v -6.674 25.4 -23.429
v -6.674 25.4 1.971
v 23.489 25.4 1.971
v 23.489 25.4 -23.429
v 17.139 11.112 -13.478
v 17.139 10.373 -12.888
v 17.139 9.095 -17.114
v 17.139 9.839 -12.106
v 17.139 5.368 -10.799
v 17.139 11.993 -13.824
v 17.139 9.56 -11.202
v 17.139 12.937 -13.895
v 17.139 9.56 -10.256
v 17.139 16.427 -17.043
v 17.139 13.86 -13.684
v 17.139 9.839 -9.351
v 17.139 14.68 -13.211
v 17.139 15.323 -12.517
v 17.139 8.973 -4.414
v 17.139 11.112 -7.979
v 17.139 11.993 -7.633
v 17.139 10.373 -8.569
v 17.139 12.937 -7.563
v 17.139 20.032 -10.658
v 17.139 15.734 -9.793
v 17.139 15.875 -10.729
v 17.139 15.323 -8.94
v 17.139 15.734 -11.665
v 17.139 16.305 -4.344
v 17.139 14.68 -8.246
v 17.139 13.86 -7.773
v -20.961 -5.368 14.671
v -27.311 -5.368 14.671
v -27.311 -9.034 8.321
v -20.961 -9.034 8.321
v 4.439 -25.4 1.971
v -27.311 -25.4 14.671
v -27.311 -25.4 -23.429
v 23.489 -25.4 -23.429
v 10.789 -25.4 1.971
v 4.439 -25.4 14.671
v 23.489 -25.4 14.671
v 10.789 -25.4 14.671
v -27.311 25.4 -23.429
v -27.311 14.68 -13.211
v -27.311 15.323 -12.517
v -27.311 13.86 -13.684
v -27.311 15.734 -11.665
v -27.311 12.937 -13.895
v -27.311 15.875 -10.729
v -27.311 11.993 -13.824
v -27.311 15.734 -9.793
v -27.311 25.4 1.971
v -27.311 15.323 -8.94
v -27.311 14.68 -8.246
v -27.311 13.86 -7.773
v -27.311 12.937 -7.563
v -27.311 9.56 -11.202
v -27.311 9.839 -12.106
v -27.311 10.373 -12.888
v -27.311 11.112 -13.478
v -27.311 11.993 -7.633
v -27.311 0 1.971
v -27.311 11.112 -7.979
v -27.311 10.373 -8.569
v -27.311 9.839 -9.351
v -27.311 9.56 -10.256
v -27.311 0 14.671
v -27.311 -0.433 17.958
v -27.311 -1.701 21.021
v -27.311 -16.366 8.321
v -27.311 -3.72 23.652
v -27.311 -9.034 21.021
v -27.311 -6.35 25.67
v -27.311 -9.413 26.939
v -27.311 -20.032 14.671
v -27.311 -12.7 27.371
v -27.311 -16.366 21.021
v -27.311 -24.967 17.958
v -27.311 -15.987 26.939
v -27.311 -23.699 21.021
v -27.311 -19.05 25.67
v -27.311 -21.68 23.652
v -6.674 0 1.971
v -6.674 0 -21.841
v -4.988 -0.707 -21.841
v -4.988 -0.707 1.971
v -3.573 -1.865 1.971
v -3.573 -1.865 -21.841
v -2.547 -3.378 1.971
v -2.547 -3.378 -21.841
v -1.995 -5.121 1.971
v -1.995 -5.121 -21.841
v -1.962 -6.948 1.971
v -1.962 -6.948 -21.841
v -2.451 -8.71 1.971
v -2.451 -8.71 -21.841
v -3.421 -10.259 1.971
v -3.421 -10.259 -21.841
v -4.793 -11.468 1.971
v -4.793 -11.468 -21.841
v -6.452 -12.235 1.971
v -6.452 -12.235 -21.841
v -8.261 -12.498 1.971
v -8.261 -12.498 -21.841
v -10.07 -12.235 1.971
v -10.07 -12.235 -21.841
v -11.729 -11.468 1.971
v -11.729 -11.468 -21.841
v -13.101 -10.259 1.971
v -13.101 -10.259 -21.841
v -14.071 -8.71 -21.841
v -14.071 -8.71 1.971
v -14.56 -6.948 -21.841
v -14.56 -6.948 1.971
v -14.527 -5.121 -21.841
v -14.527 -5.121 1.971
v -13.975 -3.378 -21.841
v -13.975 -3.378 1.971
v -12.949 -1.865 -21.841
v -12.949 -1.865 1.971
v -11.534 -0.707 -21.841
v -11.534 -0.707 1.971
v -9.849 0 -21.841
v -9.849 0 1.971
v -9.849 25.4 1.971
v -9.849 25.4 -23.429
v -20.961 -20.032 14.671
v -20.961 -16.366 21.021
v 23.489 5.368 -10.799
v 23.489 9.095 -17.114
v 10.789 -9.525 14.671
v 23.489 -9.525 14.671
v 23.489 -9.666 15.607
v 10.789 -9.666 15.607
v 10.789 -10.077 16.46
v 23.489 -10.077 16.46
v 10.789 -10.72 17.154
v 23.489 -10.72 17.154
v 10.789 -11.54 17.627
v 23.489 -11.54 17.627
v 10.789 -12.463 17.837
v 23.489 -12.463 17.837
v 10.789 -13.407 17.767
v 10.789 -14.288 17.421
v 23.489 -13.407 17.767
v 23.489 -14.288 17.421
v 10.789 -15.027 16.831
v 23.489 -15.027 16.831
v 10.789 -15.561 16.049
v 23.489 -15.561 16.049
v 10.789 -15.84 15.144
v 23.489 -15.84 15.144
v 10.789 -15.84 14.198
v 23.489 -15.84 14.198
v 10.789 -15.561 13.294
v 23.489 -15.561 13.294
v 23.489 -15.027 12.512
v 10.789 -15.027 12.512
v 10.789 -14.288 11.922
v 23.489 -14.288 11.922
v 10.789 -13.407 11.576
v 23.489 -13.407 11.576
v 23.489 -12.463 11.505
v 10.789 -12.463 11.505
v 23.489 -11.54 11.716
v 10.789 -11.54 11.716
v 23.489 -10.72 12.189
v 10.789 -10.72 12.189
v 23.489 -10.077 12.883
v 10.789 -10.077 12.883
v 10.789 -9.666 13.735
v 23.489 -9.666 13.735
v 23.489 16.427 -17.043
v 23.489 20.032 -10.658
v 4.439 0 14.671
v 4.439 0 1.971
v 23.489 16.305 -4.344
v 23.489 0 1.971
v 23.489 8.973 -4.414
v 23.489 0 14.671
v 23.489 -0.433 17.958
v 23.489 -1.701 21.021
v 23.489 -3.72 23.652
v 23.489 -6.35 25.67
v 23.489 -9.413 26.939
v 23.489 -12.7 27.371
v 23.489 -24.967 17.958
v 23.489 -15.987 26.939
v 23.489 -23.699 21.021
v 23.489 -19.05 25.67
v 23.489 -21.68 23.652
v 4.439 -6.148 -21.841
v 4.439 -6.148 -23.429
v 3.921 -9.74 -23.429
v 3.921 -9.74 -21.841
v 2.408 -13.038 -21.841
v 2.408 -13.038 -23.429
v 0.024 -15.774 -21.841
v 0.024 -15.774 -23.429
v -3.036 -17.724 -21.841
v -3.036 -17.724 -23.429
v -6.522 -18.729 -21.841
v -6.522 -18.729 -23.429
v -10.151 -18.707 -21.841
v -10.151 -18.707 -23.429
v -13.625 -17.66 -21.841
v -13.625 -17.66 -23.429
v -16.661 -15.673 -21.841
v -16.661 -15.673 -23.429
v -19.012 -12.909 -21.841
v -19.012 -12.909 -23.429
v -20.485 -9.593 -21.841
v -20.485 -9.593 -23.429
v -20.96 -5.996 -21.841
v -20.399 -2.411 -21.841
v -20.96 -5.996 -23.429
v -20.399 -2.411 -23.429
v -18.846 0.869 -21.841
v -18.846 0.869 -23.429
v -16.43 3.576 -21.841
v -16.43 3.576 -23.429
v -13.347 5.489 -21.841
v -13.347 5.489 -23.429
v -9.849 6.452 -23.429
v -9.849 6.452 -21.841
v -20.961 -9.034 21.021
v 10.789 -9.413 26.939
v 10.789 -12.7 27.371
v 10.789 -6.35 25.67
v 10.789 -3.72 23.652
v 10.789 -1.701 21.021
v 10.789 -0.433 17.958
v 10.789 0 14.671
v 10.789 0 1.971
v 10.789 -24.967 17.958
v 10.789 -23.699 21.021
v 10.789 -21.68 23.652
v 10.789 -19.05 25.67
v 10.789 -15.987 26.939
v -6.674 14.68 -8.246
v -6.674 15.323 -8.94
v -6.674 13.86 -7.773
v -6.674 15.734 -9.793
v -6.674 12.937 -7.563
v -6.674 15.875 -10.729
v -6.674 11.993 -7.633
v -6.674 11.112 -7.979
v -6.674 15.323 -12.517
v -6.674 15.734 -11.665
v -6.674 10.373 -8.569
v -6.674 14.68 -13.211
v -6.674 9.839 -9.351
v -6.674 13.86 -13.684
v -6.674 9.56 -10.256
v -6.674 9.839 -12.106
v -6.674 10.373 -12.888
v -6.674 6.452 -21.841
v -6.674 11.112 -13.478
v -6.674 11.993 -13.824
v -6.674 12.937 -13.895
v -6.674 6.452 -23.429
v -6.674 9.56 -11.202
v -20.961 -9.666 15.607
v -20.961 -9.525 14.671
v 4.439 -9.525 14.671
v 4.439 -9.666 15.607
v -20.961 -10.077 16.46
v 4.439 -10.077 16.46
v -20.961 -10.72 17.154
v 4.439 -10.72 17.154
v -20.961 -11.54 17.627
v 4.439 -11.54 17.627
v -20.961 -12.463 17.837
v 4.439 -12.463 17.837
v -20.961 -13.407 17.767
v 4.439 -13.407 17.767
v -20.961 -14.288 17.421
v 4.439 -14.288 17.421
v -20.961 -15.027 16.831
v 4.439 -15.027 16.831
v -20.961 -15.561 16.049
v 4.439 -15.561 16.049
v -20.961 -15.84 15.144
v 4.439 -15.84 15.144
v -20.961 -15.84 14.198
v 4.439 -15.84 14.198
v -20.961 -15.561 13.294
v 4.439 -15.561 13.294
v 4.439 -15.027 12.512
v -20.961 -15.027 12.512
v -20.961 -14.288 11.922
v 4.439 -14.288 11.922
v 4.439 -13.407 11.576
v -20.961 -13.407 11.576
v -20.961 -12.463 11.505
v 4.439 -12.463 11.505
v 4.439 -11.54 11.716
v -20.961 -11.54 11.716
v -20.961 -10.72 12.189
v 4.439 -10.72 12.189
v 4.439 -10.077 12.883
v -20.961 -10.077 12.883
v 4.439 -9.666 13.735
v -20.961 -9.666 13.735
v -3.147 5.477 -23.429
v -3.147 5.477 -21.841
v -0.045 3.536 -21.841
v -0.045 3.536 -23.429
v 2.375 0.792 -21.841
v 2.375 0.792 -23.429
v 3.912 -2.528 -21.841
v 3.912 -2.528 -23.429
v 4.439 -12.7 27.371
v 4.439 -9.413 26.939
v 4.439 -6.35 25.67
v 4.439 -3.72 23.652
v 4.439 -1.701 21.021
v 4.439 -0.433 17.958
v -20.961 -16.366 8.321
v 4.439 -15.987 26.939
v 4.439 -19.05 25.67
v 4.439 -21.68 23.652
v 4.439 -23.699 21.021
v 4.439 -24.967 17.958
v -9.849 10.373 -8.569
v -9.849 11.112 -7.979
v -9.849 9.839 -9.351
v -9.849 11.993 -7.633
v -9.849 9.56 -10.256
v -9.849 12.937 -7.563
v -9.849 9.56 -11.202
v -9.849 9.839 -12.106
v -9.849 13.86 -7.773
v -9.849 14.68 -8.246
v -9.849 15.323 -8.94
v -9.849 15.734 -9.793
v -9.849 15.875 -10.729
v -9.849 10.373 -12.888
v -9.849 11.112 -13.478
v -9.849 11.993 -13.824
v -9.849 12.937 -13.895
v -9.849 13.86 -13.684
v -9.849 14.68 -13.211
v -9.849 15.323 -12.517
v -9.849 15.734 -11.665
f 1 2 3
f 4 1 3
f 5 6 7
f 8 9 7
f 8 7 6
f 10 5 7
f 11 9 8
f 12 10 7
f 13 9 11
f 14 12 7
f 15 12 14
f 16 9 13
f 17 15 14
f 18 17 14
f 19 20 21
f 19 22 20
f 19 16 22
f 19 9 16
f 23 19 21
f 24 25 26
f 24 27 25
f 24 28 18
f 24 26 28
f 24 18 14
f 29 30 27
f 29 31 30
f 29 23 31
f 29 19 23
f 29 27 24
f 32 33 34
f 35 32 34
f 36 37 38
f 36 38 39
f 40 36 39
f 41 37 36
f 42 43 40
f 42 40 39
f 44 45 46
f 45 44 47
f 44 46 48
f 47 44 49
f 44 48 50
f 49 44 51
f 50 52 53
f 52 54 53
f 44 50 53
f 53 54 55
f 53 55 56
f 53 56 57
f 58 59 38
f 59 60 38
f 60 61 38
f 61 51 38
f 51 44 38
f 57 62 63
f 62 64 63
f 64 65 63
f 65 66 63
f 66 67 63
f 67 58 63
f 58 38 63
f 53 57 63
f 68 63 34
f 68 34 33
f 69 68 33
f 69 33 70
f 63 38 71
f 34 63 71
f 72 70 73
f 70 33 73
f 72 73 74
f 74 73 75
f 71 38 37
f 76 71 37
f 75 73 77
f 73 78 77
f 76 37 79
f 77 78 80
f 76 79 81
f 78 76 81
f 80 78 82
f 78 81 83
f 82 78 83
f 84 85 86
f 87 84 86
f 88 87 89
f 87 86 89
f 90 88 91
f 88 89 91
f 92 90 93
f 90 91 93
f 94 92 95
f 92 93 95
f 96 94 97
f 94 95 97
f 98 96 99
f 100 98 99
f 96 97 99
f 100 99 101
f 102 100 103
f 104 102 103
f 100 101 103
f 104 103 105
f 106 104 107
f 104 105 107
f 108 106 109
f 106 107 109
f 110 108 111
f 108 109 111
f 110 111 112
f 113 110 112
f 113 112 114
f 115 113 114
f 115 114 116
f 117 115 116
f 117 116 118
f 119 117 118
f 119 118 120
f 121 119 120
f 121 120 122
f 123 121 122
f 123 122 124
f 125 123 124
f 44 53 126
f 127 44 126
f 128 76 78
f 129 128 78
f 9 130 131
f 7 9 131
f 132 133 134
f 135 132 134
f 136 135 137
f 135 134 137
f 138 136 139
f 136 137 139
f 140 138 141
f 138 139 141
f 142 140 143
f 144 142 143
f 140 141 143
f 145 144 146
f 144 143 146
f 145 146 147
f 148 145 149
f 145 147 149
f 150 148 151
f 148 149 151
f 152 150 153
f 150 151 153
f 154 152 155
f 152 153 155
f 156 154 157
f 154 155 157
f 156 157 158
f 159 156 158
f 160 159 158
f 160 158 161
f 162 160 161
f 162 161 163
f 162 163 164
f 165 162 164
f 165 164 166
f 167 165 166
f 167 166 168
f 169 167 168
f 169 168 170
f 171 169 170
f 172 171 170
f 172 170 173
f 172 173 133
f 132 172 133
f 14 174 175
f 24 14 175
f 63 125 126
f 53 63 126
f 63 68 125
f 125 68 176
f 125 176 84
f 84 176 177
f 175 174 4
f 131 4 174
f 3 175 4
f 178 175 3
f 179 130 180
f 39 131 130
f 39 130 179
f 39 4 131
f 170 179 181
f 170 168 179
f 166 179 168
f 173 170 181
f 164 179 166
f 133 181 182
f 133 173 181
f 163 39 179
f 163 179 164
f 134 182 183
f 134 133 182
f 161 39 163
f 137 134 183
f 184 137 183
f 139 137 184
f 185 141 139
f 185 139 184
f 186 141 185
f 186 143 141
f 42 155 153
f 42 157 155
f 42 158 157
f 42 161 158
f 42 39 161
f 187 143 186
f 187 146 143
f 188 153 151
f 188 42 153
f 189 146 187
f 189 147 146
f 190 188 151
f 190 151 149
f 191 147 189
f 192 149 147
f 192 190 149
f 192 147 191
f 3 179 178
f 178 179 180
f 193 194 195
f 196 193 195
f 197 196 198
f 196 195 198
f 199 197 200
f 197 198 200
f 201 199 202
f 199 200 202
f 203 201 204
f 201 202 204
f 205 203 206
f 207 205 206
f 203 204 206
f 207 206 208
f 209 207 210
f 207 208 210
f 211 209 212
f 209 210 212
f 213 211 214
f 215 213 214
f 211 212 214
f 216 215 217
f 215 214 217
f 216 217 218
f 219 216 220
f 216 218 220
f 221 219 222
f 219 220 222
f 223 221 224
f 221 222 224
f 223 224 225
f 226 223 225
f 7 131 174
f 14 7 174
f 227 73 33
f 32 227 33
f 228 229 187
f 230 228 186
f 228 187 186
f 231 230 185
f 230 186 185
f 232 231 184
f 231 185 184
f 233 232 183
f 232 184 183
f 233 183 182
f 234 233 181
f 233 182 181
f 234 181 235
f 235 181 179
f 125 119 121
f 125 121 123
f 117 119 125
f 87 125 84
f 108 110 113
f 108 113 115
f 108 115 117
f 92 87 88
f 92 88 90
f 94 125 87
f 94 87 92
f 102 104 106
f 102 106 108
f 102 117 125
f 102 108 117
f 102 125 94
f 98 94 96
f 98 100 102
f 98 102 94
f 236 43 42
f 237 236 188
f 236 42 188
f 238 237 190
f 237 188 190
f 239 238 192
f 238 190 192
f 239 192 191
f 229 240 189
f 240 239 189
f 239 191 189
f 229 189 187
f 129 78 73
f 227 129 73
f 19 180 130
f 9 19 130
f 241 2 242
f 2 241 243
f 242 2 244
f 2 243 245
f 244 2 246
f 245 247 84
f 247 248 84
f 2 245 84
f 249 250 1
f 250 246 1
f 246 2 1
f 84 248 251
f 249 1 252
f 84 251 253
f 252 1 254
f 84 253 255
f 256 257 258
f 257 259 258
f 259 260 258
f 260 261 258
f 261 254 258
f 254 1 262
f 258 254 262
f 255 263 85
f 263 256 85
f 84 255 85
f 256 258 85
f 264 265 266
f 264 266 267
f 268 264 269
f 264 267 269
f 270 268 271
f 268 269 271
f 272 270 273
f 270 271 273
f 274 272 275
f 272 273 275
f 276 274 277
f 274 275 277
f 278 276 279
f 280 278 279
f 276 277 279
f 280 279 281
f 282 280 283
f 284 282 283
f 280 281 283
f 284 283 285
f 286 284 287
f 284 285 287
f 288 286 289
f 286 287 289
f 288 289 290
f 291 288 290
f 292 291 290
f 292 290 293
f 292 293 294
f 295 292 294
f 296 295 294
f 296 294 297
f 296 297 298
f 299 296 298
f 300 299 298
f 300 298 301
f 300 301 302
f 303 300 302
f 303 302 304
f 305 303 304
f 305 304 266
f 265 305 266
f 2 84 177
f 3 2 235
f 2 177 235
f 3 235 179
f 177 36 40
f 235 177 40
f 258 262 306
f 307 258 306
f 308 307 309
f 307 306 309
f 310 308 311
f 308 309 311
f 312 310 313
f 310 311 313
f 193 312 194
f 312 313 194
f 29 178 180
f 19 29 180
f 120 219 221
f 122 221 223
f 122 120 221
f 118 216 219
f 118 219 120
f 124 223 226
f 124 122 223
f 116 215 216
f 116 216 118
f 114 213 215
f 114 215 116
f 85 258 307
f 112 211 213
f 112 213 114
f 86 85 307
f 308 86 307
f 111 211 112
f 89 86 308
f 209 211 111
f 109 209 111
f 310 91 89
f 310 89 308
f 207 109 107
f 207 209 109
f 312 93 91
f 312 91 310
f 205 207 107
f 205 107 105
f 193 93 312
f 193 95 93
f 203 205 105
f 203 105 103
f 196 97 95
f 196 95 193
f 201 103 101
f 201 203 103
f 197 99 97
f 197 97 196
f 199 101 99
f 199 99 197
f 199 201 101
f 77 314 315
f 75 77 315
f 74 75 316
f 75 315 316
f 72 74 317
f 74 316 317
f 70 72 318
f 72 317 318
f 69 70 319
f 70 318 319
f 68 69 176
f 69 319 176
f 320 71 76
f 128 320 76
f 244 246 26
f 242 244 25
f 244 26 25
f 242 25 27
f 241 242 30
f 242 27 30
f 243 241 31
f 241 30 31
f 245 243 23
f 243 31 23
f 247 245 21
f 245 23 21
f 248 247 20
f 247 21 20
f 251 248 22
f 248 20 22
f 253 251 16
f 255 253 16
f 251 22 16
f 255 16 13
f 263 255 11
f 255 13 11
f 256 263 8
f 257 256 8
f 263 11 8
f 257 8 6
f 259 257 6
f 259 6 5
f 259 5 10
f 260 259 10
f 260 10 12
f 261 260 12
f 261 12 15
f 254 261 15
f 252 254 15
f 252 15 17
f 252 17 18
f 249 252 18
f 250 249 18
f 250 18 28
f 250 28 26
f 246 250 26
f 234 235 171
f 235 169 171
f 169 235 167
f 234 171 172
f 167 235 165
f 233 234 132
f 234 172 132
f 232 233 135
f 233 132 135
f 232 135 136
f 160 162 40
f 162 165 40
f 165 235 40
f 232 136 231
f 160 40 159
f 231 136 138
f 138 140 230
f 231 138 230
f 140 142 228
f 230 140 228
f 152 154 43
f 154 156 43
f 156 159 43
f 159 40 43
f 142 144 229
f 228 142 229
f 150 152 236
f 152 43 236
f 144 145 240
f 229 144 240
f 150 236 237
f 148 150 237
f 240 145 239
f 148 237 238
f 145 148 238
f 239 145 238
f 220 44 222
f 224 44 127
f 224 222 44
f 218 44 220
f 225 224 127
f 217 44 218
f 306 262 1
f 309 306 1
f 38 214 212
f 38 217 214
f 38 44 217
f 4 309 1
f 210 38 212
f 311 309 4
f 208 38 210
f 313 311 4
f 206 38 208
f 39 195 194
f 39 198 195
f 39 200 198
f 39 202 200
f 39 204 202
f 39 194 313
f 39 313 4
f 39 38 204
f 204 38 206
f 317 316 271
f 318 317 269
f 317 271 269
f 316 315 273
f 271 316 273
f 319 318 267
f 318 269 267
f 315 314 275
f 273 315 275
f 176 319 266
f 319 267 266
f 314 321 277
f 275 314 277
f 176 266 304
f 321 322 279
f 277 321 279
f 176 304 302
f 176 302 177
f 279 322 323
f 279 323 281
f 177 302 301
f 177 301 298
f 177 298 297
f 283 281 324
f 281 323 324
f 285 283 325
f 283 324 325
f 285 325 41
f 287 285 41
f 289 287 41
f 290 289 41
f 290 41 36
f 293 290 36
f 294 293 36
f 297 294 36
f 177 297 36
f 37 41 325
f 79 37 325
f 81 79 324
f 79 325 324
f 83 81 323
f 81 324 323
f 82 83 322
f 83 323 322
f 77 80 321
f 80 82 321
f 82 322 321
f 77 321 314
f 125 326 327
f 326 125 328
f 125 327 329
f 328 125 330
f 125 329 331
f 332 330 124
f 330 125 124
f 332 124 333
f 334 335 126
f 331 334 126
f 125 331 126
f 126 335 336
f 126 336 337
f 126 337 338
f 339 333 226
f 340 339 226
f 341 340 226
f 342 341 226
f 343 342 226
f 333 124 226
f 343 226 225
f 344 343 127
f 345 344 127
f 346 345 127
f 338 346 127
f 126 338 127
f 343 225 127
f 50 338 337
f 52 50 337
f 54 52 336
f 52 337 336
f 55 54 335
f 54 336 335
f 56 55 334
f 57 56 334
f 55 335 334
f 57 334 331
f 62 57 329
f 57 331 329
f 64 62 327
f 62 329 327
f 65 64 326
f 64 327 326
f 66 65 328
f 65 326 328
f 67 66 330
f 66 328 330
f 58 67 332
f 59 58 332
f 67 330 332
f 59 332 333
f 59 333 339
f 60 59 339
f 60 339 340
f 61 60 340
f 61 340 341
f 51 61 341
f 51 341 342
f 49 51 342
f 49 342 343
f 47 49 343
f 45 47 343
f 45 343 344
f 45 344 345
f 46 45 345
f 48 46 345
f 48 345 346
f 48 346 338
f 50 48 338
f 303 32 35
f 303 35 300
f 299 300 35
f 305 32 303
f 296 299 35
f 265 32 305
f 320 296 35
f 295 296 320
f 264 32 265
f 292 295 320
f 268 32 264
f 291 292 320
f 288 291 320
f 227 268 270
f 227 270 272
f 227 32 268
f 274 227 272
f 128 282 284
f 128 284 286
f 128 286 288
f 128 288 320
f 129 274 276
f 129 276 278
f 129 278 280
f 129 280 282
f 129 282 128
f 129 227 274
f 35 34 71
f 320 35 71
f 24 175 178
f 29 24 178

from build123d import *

# Parameters (mm, degrees)
F0_W      = 50.8
F0_H      = 50.8
F1_DEPTH  = 25.4
F3_DEPTH  = 25.4
F4_R      = 3.175
F5_DEPTH  = 50.801
F6_W      = 6.35
F6_H      = 29.9948125449
F6_H_2    = 12.7
F7_DEPTH  = 50.801
F8_R      = 3.175
F9_DEPTH  = 6.35
F10_DEPTH = 6.35
F11_DEPTH = 1.5875


# Not quite as in the source:
# - a feature names something its author has since deleted; it is built from what else it names


with BuildPart() as f1:
    # F0 (on Front) → F1 (new body, symmetric)
    with BuildSketch(Plane.XZ):
        with Locations((-1.9110422581, 1.9712704602)):
            Rectangle(F0_W, F0_H)
    extrude(amount=F1_DEPTH, both=True)

    # F2 (on face) → F3 (cut)
    with BuildSketch(Plane(origin=(0, 0, -23.4287295398), x_dir=(1, 0, 0), z_dir=(0, 0, -1))):
        with BuildLine():
            Line((-6.6735422581, -6.4520295568), (-6.6735422581, 0))
            ThreePointArc((-6.6735422581, 0), (-8.2610422581, 12.4983610621), (-9.8485422581, 0))
            Line((-9.8485422581, 0), (-9.8485422581, -6.4520295568))
            ThreePointArc((-9.8485422581, -6.4520295568), (-8.2610422581, -6.5516389379), (-6.6735422581, -6.4520295568))
        make_face()
        with BuildLine():
            Line((-6.6735422581, -25.4), (-6.6735422581, -6.4520295568))
            ThreePointArc((-6.6735422581, -6.4520295568), (-8.2610422581, -6.5516389379), (-9.8485422581, -6.4520295568))
            Line((-9.8485422581, -6.4520295568), (-9.8485422581, -25.4))
            Line((-9.8485422581, -25.4), (-6.6735422581, -25.4))
        make_face()
    extrude(amount=-F3_DEPTH, mode=Mode.SUBTRACT)

    # F4 (on face) → F5 (cut, through all)
    with BuildSketch(Plane.YZ.offset(23.4889577419)):
        with BuildLine():
            Line((-25.4, 27.3712704602), (-25.4, 14.6712704602))
            ThreePointArc((-25.4, 14.6712704602), (-21.6802561342, 23.6515265681), (-12.7000000372, 27.3712704602))
            Line((-12.7000000372, 27.3712704602), (-25.4, 27.3712704602))
        make_face()
        with BuildLine():
            Line((0, 14.6712704602), (0, 1.9712704602))
            Line((0, 1.9712704602), (25.4, 1.9712704602))
            Line((25.4, 1.9712704602), (25.4, 27.3712704602))
            Line((25.4, 27.3712704602), (-12.7000000372, 27.3712704602))
            ThreePointArc((-12.7000000372, 27.3712704602), (-3.7197438921, 23.6515265944), (0, 14.6712704602))
        make_face()
        with Locations((-12.7, 14.6712704602)):
            Circle(F4_R)
        with Locations((12.7, -10.7287295398)):
            Circle(F4_R)
    extrude(amount=-F5_DEPTH, mode=Mode.SUBTRACT)

    # F6 (on face) → F7 (cut, through all)
    with BuildSketch(Plane.XZ.offset(25.4)):
        with Locations((7.6139577419, 29.6686767327)):
            Rectangle(F6_W, F6_H)
        with Locations((7.6139577419, 8.3212704602)):
            Rectangle(F6_W, F6_H_2)
    extrude(amount=-F7_DEPTH, mode=Mode.SUBTRACT)

    # F8 (on face) → F9 (cut)
    with BuildSketch(Plane(origin=(-27.3110422581, 0, 0), x_dir=(0, -1, 0), z_dir=(-1, 0, 0))):
        Polygon((9.0338257906, 21.0212704602), (5.3676515813, 14.6712704602), (9.0338257906, 8.3212704602), (16.3661742094, 8.3212704602), (20.0323484187, 14.6712704602), (16.3661742094, 21.0212704602), align=None)
        with Locations((12.7, 14.6712704602)):
            Circle(F8_R, mode=Mode.SUBTRACT)
    extrude(amount=-F9_DEPTH, mode=Mode.SUBTRACT)

    # F4 (on face) → F10 (cut)
    with BuildSketch(Plane.YZ.offset(23.4889577419)):
        Polygon((16.4270880107, -17.0431692056), (20.0320091667, -10.6581964733), (16.3049211559, -4.3437568074), (8.9729119893, -4.414289874), (5.3679908333, -10.7992626063), (9.0950788441, -17.1137022722), align=None)
        with Locations((12.7, -10.7287295398)):
            Circle(F4_R, mode=Mode.SUBTRACT)
    extrude(amount=-F10_DEPTH, mode=Mode.SUBTRACT)

    # F2 (on face) → F11 (cut)
    with BuildSketch(Plane(origin=(0, 0, -23.4287295398), x_dir=(1, 0, 0), z_dir=(0, 0, -1))):
        with BuildLine():
            ThreePointArc((-9.8485422581, 0), (-8.2610422581, 12.4983610621), (-6.6735422581, 0))
            Line((-6.6735422581, 0), (-6.6735422581, -6.4520295568))
            ThreePointArc((-6.6735422581, -6.4520295568), (1.2639577419, -2.2518993505), (4.4389577419, 6.1483610621))
            ThreePointArc((4.4389577419, 6.1483610621), (-16.6613026708, 15.6733610621), (-9.8485422581, -6.4520295568))
            Line((-9.8485422581, -6.4520295568), (-9.8485422581, 0))
        make_face()
    extrude(amount=-F11_DEPTH, mode=Mode.SUBTRACT)


solid = f1.part
